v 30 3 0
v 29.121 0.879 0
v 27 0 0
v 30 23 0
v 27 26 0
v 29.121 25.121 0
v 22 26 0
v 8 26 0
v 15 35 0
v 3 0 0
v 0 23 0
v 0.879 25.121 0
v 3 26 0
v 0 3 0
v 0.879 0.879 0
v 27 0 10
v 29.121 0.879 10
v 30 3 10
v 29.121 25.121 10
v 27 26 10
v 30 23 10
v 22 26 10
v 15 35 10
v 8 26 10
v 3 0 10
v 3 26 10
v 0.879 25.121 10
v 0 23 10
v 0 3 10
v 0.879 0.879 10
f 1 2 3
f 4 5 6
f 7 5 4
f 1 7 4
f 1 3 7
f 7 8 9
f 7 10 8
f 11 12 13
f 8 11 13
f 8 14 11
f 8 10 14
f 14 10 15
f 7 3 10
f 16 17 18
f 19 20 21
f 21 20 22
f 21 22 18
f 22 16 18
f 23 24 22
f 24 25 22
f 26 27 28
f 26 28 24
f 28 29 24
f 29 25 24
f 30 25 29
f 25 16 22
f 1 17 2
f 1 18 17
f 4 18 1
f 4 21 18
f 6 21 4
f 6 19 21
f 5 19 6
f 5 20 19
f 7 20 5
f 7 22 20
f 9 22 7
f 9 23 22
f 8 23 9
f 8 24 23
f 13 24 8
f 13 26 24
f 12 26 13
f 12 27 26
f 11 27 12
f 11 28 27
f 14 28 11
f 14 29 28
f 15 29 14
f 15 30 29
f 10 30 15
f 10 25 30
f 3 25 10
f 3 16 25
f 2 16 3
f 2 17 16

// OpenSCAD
$fn = 32;

// ----------------------------------------------------------------------
// Ratchet pawl: 30 x 26 mm body, beak 9 mm сверху
// ----------------------------------------------------------------------

// --- parameters (mm) ---
profile_height = 10;      // extrusion height
profile_points = 15;      // points of the closed outline

profile = [[0, 3], [0.879, 0.879], [3, 0], [27, 0], [29.121, 0.879], [30, 3], [30, 23], [29.121, 25.121], [27, 26], [22, 26], [15, 35], [8, 26], [3, 26], [0.879, 25.121], [0, 23]];  // single closed polygon, 15 points, counter clockwise

// --- the one profile operation ---
linear_extrude(height = profile_height) polygon(points = profile);
